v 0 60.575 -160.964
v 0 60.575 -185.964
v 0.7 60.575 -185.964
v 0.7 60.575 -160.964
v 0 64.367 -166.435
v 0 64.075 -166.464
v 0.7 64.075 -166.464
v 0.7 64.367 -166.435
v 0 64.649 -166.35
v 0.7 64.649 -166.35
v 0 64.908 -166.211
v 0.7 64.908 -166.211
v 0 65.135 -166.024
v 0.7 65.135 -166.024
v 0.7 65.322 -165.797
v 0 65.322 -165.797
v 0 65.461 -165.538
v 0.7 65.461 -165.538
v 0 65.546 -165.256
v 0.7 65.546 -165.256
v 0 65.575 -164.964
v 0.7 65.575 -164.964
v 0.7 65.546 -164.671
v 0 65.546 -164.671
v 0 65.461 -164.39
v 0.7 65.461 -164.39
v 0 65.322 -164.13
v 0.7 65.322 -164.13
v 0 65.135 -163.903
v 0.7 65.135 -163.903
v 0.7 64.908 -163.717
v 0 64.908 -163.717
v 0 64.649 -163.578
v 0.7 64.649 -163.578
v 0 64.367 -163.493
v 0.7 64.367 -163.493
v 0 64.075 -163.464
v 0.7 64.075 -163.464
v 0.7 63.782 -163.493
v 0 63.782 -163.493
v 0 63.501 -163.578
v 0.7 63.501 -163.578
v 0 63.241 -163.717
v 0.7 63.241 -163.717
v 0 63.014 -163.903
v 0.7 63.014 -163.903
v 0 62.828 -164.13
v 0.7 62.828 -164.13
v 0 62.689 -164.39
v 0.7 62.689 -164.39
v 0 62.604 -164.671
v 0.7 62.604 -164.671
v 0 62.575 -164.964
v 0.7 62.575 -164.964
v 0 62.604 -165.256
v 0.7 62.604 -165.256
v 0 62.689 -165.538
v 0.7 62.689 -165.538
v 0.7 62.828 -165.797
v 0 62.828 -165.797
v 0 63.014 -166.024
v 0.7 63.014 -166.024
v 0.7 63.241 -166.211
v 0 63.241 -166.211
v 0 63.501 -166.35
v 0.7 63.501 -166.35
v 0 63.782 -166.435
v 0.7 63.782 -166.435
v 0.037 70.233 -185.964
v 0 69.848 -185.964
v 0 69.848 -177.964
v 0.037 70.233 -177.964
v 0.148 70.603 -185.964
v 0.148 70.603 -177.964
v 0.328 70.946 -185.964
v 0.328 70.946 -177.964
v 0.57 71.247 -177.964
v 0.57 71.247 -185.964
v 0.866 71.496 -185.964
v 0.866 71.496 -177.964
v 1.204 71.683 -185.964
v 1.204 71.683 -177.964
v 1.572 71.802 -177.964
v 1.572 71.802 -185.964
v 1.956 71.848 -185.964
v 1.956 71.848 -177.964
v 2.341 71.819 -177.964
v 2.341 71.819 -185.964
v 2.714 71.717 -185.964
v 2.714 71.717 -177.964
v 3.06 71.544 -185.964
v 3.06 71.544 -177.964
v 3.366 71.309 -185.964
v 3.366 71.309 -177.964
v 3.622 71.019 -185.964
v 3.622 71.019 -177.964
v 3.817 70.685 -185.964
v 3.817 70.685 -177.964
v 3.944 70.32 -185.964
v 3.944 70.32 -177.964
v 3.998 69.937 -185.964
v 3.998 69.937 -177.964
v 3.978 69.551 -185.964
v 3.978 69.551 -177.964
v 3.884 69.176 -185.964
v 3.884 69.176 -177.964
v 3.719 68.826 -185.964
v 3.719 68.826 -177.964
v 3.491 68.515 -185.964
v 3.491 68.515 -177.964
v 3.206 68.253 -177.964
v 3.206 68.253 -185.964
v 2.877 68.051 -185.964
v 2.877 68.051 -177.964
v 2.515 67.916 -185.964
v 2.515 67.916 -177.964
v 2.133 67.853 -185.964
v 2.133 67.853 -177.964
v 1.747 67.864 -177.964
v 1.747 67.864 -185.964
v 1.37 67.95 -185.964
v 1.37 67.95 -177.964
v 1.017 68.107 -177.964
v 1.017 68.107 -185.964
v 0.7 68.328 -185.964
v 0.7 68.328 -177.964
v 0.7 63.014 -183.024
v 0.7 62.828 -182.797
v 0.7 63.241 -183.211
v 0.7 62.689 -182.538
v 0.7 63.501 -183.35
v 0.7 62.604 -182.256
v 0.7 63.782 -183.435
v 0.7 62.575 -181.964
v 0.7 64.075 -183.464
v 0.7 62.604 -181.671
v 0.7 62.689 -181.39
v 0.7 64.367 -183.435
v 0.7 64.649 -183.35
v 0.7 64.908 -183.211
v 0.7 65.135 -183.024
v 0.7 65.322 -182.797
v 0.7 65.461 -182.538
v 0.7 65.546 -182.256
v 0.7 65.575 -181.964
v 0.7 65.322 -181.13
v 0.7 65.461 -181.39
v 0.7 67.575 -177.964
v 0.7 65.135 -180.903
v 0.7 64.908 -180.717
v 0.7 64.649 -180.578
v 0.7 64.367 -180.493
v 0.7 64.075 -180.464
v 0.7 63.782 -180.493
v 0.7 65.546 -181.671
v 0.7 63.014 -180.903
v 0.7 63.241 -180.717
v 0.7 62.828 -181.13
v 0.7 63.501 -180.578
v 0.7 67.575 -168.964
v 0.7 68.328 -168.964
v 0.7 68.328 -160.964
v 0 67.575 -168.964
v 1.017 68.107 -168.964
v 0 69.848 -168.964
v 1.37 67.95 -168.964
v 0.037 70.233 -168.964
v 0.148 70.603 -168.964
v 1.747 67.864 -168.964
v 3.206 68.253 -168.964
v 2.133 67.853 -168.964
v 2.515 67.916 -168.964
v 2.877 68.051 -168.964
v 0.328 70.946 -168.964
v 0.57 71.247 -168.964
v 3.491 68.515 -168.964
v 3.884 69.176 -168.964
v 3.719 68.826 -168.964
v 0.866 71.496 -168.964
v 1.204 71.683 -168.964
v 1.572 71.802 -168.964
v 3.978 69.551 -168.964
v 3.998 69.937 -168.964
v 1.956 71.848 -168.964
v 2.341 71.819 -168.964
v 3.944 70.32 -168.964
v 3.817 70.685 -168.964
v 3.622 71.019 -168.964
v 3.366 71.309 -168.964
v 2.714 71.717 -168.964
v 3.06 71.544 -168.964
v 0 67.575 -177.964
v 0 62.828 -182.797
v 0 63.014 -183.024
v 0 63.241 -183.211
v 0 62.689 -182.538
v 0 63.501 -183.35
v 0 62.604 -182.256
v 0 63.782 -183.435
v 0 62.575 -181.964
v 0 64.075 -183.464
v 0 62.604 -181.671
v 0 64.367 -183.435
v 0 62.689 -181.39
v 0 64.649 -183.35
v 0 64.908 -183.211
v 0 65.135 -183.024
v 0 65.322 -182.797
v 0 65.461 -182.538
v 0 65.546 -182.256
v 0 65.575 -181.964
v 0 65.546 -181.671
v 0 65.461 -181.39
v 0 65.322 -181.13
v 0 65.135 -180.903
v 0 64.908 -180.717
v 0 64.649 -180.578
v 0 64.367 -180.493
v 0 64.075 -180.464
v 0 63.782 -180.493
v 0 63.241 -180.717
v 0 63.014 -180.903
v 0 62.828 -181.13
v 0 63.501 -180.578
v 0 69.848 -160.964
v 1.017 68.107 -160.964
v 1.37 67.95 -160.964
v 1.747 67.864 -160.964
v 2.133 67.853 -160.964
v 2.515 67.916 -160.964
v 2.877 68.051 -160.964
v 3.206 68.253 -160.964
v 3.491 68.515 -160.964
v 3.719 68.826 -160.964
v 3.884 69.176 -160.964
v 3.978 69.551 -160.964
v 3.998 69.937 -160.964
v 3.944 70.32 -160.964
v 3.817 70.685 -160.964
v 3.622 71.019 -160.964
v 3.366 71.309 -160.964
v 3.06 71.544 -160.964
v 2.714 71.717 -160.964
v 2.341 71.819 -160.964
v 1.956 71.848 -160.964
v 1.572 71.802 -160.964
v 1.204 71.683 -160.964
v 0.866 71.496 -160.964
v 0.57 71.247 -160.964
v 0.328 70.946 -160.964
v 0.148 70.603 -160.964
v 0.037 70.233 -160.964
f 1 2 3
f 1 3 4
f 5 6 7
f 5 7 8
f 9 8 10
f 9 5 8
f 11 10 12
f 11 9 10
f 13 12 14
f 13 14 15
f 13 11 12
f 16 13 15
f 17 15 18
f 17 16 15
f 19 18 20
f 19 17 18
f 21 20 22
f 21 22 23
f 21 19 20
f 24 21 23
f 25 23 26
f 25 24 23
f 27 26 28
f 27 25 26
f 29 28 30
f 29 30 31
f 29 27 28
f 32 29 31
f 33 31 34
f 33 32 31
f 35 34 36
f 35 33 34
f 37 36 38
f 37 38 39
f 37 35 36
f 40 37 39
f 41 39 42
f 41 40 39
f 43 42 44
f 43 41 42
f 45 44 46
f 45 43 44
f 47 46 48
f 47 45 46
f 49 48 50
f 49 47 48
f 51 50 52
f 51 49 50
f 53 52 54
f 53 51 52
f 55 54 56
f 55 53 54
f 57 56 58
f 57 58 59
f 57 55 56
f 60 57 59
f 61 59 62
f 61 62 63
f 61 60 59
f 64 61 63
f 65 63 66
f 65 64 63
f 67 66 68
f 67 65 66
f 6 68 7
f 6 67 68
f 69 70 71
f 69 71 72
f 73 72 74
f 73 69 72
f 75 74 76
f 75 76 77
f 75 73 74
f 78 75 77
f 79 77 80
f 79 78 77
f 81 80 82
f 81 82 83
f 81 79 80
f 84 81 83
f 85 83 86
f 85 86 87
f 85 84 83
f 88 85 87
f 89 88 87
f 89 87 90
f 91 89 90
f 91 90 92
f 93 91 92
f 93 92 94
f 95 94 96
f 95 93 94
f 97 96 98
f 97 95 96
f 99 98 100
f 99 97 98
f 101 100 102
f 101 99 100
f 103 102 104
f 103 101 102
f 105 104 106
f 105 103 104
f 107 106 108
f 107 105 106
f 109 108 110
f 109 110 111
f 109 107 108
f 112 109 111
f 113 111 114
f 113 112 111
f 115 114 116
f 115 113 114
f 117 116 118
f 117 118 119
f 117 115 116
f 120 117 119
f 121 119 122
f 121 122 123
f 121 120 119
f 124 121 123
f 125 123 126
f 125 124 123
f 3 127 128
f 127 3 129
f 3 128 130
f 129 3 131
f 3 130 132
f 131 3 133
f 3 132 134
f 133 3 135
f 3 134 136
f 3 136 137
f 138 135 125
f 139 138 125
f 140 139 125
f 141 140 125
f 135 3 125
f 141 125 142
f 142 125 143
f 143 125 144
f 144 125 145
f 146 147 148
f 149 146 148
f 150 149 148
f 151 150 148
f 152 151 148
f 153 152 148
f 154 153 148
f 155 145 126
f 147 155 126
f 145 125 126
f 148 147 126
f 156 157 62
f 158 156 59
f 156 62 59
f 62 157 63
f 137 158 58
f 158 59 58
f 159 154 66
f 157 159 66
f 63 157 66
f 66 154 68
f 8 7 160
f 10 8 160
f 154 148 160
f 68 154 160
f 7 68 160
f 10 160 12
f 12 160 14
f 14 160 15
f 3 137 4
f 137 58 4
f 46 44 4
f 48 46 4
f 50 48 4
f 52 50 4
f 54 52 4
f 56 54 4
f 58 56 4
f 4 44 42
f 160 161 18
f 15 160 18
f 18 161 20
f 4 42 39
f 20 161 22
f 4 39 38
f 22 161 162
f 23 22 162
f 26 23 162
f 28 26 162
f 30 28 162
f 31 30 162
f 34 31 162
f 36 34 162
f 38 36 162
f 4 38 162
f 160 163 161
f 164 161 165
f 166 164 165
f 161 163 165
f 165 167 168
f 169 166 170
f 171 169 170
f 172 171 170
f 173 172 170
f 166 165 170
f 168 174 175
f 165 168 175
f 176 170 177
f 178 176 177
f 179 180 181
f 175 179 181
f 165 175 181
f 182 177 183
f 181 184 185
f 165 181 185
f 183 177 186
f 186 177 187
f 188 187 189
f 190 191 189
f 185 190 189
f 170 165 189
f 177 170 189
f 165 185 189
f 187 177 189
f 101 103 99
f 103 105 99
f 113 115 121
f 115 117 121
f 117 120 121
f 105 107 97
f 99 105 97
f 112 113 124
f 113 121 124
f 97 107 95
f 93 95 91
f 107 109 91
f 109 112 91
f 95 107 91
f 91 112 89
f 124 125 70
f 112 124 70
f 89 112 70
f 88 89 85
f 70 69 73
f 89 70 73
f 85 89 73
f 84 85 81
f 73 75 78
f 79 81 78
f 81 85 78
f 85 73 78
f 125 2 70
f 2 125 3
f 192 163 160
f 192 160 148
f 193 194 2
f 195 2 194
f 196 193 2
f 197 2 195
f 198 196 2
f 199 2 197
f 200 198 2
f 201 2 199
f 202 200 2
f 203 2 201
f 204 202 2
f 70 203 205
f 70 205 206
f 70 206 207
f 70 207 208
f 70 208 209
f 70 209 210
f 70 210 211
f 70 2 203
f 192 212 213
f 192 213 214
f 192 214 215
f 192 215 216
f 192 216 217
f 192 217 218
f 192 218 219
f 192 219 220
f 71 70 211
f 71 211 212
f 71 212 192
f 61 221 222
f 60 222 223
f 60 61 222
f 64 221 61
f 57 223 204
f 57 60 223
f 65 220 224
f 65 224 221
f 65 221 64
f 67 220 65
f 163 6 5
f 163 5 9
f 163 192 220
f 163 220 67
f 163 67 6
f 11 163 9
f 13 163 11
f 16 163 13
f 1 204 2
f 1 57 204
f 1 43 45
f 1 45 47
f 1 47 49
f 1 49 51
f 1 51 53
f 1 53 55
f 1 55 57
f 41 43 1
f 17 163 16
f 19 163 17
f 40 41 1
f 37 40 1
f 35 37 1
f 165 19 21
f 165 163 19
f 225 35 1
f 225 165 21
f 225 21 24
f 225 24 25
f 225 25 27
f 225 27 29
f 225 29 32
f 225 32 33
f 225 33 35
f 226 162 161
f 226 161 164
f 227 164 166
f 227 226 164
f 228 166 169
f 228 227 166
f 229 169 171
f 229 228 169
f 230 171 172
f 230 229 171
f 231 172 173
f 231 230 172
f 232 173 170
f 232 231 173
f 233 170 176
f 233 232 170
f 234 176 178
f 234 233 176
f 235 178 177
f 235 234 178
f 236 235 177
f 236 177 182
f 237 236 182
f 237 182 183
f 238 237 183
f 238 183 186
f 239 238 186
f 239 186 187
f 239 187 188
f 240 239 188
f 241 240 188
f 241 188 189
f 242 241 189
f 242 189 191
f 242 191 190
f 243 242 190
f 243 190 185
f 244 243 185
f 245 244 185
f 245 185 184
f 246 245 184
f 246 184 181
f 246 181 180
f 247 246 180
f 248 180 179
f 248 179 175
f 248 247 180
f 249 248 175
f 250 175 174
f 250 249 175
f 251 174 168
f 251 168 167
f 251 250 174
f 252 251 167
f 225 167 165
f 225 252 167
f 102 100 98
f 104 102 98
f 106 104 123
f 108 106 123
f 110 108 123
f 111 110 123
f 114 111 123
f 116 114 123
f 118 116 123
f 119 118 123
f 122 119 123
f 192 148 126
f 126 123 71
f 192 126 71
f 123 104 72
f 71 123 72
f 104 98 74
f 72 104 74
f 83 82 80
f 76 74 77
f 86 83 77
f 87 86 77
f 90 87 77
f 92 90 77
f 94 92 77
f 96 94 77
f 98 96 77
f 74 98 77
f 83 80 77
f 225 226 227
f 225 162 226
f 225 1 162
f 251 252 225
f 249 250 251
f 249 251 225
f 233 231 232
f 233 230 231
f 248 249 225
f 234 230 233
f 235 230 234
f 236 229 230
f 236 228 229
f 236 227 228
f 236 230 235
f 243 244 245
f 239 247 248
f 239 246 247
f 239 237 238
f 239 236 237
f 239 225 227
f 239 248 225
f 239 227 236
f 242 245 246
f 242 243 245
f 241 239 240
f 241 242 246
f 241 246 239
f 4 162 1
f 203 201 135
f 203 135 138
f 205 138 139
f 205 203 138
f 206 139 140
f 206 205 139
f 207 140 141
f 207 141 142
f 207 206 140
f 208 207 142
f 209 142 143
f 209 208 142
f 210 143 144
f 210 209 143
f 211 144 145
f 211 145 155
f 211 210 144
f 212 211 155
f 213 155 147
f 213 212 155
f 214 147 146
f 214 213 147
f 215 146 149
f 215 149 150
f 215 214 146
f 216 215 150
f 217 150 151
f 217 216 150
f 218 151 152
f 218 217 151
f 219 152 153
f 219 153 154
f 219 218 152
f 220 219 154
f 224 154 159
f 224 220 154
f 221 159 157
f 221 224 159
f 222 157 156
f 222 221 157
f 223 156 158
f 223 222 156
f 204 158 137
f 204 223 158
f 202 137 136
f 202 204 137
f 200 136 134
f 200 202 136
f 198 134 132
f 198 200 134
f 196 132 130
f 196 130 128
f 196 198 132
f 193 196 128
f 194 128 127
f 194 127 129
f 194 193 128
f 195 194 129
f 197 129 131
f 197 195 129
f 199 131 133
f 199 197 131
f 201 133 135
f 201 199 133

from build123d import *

# Parameters (mm, degrees)
SKETCH_1_R      = 1.5
EXTRUDE_1_DEPTH = 0.7
SKETCH_3_R      = 2
EXTRUDE_3_DEPTH = 8
SKETCH_4_R      = 2
EXTRUDE_4_DEPTH = 8


with BuildPart() as part:
    # 草图1 → 凸台-拉伸1 (new body)
    with BuildSketch(Plane(origin=(0, 0, 0), x_dir=(0, 0, -1), z_dir=(1, 0, 0))):
        Polygon((185.963773135, 67.574722086), (185.963773135, 60.574722086), (160.963773135, 60.574722086), (160.963773135, 67.574722086), (160.963773135, 69.848263268), (168.963773135, 69.848263268), (168.963773135, 67.574722086), (177.963773135, 67.574722086), (177.963773135, 69.848263268), (185.963773135, 69.848263268), align=None)
        with Locations((181.963773135, 64.074722086)):
            Circle(SKETCH_1_R, mode=Mode.SUBTRACT)
        with Locations((164.963773135, 64.074722086)):
            Circle(SKETCH_1_R, mode=Mode.SUBTRACT)
    extrude(amount=EXTRUDE_1_DEPTH)

    # 草图3 → 凸台-拉伸3 (add)
    with BuildSketch(Plane.XY.offset(-160.963773135)):
        with Locations((2, 69.848263268)):
            Circle(SKETCH_3_R)
    extrude(amount=-EXTRUDE_3_DEPTH)

    # 草图4 → 凸台-拉伸4 (add)
    with BuildSketch(Plane(origin=(0, 0, -185.963773135), x_dir=(-1, 0, 0), z_dir=(0, 0, -1))):
        with Locations((-2, 69.848263268)):
            Circle(SKETCH_4_R)
    extrude(amount=-EXTRUDE_4_DEPTH)


solid = part.part
